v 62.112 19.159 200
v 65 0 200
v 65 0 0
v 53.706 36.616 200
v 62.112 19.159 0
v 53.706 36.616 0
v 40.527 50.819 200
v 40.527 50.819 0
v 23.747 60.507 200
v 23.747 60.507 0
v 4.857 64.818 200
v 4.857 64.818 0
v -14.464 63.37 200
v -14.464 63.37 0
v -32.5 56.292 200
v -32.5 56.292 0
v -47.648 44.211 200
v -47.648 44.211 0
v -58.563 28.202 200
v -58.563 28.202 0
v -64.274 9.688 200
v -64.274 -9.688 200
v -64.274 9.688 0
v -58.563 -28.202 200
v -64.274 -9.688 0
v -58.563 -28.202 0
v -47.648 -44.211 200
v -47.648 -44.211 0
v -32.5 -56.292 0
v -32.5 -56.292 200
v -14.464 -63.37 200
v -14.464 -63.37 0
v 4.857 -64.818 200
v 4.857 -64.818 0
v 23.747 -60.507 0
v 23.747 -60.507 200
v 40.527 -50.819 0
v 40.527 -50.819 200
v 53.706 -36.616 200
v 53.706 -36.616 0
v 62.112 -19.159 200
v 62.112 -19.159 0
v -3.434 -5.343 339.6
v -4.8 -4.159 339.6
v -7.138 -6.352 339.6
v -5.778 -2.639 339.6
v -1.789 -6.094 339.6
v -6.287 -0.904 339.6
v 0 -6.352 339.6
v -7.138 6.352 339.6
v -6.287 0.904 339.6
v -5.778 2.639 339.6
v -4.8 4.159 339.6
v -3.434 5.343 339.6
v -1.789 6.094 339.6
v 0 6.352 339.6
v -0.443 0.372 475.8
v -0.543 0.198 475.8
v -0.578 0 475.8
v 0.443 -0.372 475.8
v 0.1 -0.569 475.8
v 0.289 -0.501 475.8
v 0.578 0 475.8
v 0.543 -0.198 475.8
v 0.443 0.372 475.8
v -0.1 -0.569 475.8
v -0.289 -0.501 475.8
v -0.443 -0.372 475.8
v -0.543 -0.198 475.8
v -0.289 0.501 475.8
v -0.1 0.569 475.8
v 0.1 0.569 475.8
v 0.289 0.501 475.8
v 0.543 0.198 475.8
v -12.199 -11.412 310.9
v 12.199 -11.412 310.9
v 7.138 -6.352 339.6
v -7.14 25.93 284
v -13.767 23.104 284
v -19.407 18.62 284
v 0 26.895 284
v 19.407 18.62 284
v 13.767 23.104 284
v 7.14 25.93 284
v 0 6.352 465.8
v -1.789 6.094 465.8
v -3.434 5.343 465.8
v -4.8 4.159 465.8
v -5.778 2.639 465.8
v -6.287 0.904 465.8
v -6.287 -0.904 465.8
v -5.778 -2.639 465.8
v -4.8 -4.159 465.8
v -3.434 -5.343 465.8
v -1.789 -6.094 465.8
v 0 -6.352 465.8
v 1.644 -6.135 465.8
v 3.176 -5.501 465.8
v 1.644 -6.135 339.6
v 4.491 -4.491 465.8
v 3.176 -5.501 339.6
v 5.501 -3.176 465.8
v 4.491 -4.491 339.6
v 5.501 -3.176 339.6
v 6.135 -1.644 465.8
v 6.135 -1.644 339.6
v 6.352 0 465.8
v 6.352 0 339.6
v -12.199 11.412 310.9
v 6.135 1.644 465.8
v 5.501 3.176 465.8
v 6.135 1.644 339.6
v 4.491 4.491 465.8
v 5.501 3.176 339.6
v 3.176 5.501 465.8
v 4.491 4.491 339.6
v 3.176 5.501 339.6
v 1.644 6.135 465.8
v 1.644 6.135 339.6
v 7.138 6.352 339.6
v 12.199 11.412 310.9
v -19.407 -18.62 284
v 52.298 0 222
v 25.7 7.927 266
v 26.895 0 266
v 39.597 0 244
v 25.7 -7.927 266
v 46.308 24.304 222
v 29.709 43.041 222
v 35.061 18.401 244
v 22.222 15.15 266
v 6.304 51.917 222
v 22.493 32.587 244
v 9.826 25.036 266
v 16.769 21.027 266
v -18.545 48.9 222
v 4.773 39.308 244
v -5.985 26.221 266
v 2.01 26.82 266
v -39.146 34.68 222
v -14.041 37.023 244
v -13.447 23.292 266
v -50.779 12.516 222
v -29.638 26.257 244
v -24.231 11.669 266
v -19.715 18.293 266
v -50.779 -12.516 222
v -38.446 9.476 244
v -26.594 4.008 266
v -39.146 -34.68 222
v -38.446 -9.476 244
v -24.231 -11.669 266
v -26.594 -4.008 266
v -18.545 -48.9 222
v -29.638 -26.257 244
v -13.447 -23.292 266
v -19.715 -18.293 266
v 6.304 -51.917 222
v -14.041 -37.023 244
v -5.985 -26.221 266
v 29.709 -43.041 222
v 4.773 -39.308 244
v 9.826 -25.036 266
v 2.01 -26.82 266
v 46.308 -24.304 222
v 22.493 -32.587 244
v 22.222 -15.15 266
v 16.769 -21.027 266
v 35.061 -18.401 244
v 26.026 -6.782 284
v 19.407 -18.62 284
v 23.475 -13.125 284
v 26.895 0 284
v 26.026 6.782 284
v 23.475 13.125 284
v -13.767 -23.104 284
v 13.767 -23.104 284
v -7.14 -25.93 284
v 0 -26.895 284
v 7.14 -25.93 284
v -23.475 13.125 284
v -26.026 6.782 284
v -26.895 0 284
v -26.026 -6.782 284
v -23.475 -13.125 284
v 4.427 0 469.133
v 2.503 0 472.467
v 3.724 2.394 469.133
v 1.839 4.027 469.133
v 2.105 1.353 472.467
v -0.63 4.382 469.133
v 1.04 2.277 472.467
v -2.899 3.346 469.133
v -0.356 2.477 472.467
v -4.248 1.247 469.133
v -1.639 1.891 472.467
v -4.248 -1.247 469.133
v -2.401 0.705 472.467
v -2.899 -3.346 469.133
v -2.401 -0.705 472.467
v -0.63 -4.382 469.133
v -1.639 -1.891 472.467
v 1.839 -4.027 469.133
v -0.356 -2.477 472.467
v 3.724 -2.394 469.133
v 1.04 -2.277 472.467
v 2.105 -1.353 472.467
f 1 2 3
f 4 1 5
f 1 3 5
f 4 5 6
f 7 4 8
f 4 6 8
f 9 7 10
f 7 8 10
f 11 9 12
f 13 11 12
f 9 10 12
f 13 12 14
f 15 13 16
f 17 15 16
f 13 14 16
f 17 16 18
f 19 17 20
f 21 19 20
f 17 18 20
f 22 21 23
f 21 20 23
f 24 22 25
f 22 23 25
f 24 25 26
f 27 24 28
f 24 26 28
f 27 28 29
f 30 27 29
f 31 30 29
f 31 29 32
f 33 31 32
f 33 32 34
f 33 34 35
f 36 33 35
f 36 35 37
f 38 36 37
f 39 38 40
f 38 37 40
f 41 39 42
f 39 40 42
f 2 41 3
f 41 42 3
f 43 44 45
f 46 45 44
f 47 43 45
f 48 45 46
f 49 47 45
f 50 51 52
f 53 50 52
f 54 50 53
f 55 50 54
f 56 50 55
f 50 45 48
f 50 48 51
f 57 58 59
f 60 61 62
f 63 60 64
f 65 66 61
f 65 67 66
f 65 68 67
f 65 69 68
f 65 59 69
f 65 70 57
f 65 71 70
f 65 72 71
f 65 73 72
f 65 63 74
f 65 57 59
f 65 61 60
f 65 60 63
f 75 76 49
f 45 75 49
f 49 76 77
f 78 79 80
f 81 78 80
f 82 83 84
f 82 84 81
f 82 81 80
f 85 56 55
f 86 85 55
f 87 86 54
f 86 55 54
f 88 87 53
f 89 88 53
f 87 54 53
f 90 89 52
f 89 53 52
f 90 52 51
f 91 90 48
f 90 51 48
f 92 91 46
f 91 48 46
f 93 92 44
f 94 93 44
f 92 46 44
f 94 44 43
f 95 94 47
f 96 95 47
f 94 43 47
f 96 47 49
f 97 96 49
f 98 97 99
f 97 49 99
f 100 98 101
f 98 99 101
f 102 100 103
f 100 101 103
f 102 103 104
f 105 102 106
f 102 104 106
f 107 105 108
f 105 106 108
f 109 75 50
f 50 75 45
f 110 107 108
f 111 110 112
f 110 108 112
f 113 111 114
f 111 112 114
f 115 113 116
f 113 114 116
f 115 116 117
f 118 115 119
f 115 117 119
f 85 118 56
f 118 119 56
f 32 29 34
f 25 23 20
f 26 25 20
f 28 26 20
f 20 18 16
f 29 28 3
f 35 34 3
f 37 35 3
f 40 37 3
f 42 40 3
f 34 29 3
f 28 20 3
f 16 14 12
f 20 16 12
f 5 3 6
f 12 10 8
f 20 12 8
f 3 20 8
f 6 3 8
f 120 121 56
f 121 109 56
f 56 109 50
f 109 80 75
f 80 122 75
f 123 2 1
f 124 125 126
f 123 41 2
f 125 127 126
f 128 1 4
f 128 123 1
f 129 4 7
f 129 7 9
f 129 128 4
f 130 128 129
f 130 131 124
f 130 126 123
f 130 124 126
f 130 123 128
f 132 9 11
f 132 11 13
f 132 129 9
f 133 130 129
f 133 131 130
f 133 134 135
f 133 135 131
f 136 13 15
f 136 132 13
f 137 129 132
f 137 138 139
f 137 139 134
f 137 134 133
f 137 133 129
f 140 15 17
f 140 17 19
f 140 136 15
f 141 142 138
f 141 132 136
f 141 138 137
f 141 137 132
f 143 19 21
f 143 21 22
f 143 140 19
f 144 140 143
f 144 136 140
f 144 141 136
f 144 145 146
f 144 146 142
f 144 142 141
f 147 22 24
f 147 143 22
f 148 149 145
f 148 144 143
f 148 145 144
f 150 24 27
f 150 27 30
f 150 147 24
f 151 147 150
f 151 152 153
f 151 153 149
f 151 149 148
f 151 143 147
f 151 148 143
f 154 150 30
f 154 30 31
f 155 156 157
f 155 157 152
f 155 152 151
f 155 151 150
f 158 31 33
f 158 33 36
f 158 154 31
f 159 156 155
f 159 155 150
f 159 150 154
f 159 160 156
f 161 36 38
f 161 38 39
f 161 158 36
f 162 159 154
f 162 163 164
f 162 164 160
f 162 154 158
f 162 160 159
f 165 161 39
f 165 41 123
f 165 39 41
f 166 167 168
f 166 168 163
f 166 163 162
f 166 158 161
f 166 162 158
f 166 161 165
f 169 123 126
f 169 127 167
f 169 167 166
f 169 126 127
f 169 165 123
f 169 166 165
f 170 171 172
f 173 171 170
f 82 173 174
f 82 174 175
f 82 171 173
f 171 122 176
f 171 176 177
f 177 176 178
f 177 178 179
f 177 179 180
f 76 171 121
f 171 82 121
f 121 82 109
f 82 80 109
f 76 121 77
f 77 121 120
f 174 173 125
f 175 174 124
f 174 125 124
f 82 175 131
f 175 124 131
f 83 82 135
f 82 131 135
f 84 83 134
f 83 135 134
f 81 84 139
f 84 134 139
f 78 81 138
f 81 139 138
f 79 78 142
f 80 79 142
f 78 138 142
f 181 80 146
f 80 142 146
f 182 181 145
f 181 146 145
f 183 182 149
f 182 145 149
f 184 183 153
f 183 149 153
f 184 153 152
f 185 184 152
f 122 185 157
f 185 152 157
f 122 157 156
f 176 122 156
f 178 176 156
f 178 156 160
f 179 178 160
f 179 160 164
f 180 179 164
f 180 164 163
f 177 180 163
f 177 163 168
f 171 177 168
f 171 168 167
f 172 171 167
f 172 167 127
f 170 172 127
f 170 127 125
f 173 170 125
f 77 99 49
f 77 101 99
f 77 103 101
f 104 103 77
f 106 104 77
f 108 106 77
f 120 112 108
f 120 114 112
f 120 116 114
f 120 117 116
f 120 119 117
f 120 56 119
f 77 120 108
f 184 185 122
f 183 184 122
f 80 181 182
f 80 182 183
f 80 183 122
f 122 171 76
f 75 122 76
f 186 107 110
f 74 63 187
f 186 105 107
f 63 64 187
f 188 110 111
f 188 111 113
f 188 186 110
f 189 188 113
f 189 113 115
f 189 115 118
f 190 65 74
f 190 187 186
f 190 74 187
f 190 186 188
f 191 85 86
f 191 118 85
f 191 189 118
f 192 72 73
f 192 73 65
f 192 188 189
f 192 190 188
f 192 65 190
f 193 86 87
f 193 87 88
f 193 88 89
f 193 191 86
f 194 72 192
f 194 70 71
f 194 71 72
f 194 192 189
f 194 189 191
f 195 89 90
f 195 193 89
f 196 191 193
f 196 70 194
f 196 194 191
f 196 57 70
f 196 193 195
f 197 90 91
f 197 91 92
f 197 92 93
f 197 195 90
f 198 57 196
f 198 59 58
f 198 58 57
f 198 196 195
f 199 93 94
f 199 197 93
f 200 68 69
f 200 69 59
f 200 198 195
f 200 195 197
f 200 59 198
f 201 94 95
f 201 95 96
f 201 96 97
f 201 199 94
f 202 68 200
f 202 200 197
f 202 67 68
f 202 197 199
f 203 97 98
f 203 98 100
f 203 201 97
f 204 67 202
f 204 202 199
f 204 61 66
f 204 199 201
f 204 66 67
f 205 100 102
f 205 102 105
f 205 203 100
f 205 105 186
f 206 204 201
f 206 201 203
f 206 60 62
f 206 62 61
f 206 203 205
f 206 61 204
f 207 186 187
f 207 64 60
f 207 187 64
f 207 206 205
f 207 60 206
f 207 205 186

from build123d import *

# Parameters (mm, degrees)
F0_R       = 65
F1_DEPTH   = 200
F2_R       = 65
F3_DEPTH   = 66
F3_TAPER   = 30
F4_R       = 26.8948822335
F5_DEPTH   = 18
F6_W       = 38.8136626348
F6_H       = 37.2402786548
F7_DEPTH   = 26.9
F7_TAPER   = 15
F7_FACE_W  = 24.397996082
F7_FACE_H  = 22.824612102
F8_DEPTH   = 28.7
F8_TAPER   = 10
F10_DEPTH  = 126.2
F11_R      = 6.3517217046
F10_FACE_R = 6.3517217046
F12_DEPTH  = 10
F12_TAPER  = 30


with BuildPart() as f1:
    # F0 (on Top) → F1 (new body)
    with BuildSketch(Plane.XY):
        Circle(F0_R)
    extrude(amount=F1_DEPTH)

    # F2 (on face) → F3 (join)
    with BuildSketch(Plane.XY.offset(200)):
        Circle(F2_R)
    extrude(amount=F3_DEPTH, taper=F3_TAPER)

    # F4 (on face) → F5 (join)
    with BuildSketch(Plane.XY.offset(266)):
        Circle(F4_R)
    extrude(amount=F5_DEPTH)

    # F6 (on face) → F7 (join)
    with BuildSketch(Plane.XY.offset(284)):
        Rectangle(F6_W, F6_H)
    extrude(amount=F7_DEPTH, taper=F7_TAPER)

    # F7_face (on face) → F8 (join)
    with BuildSketch(Plane.XY.offset(310.9)):
        Rectangle(F7_FACE_W, F7_FACE_H)
    extrude(amount=F8_DEPTH, taper=F8_TAPER)

    # F9 (on face) → F10 (join)
    with BuildSketch(Plane.XY.offset(339.6)):
        with BuildLine():
            ThreePointArc((0, -6.3517217046), (4.4913454896, -4.4913454896), (6.3517217046, 0))
            ThreePointArc((6.3517217046, 0), (4.4913454896, 4.4913454896), (0, 6.3517217046))
            ThreePointArc((0, 6.3517217046), (-6.3517217046, 0), (0, -6.3517217046))
        make_face()
    extrude(amount=F10_DEPTH)

    # F11 (on face) + F10_face (on face) → F12 (join)
    with BuildSketch(Plane.XY.offset(465.8)):
        Circle(F11_R)
    with BuildSketch(Plane.XY.offset(465.8)):
        Circle(F10_FACE_R)
    extrude(amount=F12_DEPTH, taper=F12_TAPER)


solid = f1.part
